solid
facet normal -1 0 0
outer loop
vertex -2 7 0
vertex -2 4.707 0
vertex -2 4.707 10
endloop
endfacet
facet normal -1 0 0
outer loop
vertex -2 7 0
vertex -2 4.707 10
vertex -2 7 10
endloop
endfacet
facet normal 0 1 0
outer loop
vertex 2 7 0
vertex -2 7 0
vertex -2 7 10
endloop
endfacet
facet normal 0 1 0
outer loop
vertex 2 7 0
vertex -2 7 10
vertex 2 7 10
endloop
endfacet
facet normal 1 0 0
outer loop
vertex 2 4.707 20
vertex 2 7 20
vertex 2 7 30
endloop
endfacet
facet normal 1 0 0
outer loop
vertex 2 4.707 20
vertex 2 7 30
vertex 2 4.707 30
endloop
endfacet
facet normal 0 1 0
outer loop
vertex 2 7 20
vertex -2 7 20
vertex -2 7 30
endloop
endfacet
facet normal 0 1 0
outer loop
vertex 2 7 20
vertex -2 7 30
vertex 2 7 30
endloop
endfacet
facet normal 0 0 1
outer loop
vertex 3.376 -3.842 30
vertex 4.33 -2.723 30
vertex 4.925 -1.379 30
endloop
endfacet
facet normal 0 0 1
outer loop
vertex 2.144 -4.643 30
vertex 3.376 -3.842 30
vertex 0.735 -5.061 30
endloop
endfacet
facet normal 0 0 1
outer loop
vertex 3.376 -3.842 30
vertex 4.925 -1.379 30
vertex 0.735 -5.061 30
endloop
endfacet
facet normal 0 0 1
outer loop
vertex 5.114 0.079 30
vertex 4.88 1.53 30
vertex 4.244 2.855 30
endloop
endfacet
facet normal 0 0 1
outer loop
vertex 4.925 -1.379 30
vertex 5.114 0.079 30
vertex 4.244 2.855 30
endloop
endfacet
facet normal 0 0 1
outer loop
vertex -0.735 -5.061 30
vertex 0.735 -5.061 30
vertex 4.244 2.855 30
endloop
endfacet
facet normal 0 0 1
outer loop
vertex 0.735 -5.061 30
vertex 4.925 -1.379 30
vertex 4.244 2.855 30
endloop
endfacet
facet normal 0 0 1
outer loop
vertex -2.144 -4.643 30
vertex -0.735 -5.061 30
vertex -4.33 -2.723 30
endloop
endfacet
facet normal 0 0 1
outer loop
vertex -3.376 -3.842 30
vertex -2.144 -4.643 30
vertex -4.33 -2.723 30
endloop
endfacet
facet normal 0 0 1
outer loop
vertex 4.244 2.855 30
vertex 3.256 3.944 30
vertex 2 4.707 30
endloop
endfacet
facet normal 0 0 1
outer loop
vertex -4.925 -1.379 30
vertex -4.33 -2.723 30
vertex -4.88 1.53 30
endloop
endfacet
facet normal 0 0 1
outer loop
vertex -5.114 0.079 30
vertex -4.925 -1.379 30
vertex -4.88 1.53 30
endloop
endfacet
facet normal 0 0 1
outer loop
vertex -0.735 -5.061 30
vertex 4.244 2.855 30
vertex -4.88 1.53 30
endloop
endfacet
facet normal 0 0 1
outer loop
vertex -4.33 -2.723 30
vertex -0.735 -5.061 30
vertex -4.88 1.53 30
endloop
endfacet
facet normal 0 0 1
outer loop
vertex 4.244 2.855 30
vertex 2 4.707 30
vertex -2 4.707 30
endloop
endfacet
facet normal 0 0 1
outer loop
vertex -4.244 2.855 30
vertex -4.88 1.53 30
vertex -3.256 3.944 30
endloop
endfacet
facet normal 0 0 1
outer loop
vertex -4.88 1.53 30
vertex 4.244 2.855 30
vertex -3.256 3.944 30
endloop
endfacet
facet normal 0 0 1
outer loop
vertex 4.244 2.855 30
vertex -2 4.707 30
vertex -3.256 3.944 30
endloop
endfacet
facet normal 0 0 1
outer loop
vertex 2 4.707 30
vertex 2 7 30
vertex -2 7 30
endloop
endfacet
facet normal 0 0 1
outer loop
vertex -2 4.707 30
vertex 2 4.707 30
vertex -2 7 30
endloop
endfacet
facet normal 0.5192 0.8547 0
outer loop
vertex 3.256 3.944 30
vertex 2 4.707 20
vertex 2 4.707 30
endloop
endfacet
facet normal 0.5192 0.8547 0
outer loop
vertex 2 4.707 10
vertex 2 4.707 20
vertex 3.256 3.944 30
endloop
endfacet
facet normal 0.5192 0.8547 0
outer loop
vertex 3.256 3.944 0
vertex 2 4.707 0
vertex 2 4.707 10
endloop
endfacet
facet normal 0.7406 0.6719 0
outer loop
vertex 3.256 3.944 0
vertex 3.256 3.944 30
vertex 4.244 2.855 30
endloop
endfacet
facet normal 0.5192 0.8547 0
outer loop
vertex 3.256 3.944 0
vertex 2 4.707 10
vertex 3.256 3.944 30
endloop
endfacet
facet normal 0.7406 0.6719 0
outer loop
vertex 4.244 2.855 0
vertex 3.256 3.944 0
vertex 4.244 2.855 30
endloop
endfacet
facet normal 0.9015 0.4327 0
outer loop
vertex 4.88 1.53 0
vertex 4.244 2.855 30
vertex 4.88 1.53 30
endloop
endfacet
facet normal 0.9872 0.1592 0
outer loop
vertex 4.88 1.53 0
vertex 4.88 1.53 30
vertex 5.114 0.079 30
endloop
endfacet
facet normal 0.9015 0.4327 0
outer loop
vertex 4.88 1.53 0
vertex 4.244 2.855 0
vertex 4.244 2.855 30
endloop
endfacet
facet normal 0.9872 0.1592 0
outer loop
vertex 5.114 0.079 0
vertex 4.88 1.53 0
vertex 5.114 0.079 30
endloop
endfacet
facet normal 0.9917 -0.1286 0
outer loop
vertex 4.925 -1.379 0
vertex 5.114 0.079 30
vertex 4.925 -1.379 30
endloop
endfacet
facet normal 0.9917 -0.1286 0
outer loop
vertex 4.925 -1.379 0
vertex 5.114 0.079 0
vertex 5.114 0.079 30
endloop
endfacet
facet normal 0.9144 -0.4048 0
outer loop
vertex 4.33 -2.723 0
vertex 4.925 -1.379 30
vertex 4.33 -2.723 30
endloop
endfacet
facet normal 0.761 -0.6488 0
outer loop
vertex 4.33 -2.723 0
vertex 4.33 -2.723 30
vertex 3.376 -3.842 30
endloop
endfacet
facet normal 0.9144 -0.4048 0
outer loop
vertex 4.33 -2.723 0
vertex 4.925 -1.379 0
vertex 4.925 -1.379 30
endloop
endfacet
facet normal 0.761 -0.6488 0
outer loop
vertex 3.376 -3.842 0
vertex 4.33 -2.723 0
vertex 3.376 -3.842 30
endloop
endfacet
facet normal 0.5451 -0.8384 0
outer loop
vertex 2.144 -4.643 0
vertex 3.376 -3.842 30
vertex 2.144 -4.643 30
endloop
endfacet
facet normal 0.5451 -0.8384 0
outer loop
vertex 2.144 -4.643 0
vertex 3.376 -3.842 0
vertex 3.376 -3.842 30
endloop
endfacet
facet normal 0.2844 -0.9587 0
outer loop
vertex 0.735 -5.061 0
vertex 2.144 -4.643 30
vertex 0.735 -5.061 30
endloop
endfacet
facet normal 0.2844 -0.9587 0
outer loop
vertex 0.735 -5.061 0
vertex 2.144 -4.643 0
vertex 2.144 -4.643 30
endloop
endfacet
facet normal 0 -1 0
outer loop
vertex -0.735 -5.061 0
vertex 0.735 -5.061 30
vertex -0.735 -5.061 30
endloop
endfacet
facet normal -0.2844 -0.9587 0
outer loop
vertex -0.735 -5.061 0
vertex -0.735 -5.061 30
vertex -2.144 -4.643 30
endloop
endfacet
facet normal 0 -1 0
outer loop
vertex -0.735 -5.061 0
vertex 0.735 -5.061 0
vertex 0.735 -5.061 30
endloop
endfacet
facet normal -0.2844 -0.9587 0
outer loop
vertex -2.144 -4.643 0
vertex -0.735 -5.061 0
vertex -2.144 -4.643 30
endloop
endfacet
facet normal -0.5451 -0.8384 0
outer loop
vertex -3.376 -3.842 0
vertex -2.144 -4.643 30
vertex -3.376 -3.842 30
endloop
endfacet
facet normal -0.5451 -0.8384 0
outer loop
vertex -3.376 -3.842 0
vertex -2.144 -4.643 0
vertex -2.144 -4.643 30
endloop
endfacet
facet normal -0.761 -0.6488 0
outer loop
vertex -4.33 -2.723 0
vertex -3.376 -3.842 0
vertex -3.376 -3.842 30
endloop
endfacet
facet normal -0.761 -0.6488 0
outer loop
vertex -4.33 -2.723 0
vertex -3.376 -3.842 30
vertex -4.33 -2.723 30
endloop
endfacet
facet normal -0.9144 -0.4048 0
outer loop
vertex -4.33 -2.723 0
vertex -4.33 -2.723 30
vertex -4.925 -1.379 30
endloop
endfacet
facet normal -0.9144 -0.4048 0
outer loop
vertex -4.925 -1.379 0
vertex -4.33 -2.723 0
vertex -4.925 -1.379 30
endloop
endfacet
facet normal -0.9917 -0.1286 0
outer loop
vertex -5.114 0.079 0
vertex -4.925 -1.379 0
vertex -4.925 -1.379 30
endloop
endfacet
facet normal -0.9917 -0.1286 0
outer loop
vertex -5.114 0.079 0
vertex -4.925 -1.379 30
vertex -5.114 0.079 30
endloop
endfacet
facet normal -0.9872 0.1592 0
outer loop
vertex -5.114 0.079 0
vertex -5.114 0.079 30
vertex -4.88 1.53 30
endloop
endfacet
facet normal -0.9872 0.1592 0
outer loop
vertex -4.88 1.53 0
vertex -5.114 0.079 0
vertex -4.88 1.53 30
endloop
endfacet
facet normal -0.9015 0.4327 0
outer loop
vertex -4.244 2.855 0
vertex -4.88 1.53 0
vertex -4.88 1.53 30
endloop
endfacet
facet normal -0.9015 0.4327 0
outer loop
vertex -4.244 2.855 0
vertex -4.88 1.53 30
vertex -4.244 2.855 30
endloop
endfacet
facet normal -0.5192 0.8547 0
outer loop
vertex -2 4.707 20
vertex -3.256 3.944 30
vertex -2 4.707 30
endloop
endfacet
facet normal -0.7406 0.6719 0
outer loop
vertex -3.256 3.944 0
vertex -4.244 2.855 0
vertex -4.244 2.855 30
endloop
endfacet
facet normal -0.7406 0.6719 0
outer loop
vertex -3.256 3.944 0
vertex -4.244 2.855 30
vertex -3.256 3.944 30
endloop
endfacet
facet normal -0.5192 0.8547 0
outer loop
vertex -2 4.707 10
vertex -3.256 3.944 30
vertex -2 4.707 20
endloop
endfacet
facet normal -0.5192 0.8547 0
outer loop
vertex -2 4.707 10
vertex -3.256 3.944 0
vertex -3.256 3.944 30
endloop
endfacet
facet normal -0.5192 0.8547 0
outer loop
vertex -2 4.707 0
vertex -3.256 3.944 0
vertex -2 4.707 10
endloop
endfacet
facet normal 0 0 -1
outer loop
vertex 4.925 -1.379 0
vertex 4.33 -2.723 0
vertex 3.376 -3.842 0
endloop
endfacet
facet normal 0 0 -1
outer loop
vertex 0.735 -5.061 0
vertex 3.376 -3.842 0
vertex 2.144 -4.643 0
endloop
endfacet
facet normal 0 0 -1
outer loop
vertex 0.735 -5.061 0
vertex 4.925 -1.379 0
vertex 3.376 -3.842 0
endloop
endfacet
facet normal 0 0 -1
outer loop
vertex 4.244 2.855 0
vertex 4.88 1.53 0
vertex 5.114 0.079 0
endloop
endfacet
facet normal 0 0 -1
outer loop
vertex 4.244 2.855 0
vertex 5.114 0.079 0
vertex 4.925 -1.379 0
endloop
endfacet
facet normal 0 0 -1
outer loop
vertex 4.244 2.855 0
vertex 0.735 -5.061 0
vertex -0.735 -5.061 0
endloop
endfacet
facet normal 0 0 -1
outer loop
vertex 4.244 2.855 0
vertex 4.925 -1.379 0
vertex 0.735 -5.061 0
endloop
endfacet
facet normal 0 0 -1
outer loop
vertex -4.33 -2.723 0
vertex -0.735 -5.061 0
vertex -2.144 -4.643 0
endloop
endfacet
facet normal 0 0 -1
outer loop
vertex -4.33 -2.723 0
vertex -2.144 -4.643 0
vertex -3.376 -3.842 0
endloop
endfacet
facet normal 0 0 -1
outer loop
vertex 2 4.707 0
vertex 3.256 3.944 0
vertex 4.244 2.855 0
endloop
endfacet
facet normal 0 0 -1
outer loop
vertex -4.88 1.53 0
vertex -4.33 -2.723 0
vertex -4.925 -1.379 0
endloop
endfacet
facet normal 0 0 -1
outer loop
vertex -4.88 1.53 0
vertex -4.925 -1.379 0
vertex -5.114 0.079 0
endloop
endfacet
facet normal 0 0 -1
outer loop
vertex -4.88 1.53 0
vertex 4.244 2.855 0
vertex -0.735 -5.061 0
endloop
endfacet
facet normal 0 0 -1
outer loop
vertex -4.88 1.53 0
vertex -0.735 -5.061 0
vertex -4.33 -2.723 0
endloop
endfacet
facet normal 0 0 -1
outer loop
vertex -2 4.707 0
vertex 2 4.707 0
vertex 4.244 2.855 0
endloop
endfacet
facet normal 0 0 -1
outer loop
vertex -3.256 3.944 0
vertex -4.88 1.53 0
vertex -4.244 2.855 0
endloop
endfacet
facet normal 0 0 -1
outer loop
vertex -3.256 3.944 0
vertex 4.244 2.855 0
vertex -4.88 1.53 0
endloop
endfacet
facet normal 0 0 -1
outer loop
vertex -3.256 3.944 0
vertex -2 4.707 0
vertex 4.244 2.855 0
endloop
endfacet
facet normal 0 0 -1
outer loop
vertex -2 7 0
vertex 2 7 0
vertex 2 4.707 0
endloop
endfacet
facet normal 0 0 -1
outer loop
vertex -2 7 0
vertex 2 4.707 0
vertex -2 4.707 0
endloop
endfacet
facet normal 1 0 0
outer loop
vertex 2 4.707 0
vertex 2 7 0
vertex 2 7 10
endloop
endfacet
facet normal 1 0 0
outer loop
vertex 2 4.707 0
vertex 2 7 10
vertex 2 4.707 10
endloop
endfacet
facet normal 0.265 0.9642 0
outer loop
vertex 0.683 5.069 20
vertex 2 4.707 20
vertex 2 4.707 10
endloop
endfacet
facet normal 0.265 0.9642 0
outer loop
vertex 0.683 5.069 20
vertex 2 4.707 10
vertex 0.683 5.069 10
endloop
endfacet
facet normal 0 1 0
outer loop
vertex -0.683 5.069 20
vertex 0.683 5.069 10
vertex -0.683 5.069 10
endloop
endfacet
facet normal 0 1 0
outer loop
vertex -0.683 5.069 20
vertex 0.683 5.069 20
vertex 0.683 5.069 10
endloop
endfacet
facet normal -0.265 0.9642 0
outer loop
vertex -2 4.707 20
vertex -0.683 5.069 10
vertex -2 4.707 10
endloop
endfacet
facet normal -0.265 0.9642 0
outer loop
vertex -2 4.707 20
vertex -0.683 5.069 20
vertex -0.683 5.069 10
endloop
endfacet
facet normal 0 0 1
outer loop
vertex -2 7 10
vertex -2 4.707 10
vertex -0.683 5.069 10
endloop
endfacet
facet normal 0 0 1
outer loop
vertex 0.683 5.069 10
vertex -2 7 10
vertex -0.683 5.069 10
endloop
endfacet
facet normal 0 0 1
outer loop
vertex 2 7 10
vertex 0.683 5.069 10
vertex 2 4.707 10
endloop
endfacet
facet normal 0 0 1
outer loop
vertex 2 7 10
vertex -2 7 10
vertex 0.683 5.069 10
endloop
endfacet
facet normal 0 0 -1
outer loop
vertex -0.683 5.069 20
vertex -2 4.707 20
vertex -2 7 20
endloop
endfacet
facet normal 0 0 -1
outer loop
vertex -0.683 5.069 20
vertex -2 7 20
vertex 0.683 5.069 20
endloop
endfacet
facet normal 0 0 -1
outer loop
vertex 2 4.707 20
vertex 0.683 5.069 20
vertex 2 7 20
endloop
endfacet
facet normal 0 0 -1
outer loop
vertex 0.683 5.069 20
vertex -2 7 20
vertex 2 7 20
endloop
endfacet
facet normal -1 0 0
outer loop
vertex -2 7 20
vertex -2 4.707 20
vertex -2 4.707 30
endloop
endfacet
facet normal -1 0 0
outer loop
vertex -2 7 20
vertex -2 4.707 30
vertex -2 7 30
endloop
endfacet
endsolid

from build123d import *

# Parameters (mm, degrees)
BOSS_EXTRUDE1_DEPTH = 30
CUT_EXTRUDE2_START  = -10
SKETCH2_R           = 9.068137576
SKETCH2_R_2         = 5.1145
CUT_EXTRUDE2_DEPTH  = 10


with BuildPart() as part:
    # Sketch1 → Boss-Extrude1 (new body)
    with BuildSketch(Plane.XY):
        with BuildLine():
            Line((-2, 7), (2, 7))
            Line((2, 7), (2, 4.707240195))
            ThreePointArc((2, 4.707240195), (0, -5.1145), (-2, 4.707240195))
            Line((-2, 4.707240195), (-2, 7))
        make_face()
    extrude(amount=BOSS_EXTRUDE1_DEPTH)

    # Sketch2 → Cut-Extrude2 (cut)
    with BuildSketch(Plane.XY.offset(30).offset(CUT_EXTRUDE2_START)):
        Circle(SKETCH2_R)
        Circle(SKETCH2_R_2, mode=Mode.SUBTRACT)
    extrude(amount=-CUT_EXTRUDE2_DEPTH, mode=Mode.SUBTRACT)


solid = part.part
